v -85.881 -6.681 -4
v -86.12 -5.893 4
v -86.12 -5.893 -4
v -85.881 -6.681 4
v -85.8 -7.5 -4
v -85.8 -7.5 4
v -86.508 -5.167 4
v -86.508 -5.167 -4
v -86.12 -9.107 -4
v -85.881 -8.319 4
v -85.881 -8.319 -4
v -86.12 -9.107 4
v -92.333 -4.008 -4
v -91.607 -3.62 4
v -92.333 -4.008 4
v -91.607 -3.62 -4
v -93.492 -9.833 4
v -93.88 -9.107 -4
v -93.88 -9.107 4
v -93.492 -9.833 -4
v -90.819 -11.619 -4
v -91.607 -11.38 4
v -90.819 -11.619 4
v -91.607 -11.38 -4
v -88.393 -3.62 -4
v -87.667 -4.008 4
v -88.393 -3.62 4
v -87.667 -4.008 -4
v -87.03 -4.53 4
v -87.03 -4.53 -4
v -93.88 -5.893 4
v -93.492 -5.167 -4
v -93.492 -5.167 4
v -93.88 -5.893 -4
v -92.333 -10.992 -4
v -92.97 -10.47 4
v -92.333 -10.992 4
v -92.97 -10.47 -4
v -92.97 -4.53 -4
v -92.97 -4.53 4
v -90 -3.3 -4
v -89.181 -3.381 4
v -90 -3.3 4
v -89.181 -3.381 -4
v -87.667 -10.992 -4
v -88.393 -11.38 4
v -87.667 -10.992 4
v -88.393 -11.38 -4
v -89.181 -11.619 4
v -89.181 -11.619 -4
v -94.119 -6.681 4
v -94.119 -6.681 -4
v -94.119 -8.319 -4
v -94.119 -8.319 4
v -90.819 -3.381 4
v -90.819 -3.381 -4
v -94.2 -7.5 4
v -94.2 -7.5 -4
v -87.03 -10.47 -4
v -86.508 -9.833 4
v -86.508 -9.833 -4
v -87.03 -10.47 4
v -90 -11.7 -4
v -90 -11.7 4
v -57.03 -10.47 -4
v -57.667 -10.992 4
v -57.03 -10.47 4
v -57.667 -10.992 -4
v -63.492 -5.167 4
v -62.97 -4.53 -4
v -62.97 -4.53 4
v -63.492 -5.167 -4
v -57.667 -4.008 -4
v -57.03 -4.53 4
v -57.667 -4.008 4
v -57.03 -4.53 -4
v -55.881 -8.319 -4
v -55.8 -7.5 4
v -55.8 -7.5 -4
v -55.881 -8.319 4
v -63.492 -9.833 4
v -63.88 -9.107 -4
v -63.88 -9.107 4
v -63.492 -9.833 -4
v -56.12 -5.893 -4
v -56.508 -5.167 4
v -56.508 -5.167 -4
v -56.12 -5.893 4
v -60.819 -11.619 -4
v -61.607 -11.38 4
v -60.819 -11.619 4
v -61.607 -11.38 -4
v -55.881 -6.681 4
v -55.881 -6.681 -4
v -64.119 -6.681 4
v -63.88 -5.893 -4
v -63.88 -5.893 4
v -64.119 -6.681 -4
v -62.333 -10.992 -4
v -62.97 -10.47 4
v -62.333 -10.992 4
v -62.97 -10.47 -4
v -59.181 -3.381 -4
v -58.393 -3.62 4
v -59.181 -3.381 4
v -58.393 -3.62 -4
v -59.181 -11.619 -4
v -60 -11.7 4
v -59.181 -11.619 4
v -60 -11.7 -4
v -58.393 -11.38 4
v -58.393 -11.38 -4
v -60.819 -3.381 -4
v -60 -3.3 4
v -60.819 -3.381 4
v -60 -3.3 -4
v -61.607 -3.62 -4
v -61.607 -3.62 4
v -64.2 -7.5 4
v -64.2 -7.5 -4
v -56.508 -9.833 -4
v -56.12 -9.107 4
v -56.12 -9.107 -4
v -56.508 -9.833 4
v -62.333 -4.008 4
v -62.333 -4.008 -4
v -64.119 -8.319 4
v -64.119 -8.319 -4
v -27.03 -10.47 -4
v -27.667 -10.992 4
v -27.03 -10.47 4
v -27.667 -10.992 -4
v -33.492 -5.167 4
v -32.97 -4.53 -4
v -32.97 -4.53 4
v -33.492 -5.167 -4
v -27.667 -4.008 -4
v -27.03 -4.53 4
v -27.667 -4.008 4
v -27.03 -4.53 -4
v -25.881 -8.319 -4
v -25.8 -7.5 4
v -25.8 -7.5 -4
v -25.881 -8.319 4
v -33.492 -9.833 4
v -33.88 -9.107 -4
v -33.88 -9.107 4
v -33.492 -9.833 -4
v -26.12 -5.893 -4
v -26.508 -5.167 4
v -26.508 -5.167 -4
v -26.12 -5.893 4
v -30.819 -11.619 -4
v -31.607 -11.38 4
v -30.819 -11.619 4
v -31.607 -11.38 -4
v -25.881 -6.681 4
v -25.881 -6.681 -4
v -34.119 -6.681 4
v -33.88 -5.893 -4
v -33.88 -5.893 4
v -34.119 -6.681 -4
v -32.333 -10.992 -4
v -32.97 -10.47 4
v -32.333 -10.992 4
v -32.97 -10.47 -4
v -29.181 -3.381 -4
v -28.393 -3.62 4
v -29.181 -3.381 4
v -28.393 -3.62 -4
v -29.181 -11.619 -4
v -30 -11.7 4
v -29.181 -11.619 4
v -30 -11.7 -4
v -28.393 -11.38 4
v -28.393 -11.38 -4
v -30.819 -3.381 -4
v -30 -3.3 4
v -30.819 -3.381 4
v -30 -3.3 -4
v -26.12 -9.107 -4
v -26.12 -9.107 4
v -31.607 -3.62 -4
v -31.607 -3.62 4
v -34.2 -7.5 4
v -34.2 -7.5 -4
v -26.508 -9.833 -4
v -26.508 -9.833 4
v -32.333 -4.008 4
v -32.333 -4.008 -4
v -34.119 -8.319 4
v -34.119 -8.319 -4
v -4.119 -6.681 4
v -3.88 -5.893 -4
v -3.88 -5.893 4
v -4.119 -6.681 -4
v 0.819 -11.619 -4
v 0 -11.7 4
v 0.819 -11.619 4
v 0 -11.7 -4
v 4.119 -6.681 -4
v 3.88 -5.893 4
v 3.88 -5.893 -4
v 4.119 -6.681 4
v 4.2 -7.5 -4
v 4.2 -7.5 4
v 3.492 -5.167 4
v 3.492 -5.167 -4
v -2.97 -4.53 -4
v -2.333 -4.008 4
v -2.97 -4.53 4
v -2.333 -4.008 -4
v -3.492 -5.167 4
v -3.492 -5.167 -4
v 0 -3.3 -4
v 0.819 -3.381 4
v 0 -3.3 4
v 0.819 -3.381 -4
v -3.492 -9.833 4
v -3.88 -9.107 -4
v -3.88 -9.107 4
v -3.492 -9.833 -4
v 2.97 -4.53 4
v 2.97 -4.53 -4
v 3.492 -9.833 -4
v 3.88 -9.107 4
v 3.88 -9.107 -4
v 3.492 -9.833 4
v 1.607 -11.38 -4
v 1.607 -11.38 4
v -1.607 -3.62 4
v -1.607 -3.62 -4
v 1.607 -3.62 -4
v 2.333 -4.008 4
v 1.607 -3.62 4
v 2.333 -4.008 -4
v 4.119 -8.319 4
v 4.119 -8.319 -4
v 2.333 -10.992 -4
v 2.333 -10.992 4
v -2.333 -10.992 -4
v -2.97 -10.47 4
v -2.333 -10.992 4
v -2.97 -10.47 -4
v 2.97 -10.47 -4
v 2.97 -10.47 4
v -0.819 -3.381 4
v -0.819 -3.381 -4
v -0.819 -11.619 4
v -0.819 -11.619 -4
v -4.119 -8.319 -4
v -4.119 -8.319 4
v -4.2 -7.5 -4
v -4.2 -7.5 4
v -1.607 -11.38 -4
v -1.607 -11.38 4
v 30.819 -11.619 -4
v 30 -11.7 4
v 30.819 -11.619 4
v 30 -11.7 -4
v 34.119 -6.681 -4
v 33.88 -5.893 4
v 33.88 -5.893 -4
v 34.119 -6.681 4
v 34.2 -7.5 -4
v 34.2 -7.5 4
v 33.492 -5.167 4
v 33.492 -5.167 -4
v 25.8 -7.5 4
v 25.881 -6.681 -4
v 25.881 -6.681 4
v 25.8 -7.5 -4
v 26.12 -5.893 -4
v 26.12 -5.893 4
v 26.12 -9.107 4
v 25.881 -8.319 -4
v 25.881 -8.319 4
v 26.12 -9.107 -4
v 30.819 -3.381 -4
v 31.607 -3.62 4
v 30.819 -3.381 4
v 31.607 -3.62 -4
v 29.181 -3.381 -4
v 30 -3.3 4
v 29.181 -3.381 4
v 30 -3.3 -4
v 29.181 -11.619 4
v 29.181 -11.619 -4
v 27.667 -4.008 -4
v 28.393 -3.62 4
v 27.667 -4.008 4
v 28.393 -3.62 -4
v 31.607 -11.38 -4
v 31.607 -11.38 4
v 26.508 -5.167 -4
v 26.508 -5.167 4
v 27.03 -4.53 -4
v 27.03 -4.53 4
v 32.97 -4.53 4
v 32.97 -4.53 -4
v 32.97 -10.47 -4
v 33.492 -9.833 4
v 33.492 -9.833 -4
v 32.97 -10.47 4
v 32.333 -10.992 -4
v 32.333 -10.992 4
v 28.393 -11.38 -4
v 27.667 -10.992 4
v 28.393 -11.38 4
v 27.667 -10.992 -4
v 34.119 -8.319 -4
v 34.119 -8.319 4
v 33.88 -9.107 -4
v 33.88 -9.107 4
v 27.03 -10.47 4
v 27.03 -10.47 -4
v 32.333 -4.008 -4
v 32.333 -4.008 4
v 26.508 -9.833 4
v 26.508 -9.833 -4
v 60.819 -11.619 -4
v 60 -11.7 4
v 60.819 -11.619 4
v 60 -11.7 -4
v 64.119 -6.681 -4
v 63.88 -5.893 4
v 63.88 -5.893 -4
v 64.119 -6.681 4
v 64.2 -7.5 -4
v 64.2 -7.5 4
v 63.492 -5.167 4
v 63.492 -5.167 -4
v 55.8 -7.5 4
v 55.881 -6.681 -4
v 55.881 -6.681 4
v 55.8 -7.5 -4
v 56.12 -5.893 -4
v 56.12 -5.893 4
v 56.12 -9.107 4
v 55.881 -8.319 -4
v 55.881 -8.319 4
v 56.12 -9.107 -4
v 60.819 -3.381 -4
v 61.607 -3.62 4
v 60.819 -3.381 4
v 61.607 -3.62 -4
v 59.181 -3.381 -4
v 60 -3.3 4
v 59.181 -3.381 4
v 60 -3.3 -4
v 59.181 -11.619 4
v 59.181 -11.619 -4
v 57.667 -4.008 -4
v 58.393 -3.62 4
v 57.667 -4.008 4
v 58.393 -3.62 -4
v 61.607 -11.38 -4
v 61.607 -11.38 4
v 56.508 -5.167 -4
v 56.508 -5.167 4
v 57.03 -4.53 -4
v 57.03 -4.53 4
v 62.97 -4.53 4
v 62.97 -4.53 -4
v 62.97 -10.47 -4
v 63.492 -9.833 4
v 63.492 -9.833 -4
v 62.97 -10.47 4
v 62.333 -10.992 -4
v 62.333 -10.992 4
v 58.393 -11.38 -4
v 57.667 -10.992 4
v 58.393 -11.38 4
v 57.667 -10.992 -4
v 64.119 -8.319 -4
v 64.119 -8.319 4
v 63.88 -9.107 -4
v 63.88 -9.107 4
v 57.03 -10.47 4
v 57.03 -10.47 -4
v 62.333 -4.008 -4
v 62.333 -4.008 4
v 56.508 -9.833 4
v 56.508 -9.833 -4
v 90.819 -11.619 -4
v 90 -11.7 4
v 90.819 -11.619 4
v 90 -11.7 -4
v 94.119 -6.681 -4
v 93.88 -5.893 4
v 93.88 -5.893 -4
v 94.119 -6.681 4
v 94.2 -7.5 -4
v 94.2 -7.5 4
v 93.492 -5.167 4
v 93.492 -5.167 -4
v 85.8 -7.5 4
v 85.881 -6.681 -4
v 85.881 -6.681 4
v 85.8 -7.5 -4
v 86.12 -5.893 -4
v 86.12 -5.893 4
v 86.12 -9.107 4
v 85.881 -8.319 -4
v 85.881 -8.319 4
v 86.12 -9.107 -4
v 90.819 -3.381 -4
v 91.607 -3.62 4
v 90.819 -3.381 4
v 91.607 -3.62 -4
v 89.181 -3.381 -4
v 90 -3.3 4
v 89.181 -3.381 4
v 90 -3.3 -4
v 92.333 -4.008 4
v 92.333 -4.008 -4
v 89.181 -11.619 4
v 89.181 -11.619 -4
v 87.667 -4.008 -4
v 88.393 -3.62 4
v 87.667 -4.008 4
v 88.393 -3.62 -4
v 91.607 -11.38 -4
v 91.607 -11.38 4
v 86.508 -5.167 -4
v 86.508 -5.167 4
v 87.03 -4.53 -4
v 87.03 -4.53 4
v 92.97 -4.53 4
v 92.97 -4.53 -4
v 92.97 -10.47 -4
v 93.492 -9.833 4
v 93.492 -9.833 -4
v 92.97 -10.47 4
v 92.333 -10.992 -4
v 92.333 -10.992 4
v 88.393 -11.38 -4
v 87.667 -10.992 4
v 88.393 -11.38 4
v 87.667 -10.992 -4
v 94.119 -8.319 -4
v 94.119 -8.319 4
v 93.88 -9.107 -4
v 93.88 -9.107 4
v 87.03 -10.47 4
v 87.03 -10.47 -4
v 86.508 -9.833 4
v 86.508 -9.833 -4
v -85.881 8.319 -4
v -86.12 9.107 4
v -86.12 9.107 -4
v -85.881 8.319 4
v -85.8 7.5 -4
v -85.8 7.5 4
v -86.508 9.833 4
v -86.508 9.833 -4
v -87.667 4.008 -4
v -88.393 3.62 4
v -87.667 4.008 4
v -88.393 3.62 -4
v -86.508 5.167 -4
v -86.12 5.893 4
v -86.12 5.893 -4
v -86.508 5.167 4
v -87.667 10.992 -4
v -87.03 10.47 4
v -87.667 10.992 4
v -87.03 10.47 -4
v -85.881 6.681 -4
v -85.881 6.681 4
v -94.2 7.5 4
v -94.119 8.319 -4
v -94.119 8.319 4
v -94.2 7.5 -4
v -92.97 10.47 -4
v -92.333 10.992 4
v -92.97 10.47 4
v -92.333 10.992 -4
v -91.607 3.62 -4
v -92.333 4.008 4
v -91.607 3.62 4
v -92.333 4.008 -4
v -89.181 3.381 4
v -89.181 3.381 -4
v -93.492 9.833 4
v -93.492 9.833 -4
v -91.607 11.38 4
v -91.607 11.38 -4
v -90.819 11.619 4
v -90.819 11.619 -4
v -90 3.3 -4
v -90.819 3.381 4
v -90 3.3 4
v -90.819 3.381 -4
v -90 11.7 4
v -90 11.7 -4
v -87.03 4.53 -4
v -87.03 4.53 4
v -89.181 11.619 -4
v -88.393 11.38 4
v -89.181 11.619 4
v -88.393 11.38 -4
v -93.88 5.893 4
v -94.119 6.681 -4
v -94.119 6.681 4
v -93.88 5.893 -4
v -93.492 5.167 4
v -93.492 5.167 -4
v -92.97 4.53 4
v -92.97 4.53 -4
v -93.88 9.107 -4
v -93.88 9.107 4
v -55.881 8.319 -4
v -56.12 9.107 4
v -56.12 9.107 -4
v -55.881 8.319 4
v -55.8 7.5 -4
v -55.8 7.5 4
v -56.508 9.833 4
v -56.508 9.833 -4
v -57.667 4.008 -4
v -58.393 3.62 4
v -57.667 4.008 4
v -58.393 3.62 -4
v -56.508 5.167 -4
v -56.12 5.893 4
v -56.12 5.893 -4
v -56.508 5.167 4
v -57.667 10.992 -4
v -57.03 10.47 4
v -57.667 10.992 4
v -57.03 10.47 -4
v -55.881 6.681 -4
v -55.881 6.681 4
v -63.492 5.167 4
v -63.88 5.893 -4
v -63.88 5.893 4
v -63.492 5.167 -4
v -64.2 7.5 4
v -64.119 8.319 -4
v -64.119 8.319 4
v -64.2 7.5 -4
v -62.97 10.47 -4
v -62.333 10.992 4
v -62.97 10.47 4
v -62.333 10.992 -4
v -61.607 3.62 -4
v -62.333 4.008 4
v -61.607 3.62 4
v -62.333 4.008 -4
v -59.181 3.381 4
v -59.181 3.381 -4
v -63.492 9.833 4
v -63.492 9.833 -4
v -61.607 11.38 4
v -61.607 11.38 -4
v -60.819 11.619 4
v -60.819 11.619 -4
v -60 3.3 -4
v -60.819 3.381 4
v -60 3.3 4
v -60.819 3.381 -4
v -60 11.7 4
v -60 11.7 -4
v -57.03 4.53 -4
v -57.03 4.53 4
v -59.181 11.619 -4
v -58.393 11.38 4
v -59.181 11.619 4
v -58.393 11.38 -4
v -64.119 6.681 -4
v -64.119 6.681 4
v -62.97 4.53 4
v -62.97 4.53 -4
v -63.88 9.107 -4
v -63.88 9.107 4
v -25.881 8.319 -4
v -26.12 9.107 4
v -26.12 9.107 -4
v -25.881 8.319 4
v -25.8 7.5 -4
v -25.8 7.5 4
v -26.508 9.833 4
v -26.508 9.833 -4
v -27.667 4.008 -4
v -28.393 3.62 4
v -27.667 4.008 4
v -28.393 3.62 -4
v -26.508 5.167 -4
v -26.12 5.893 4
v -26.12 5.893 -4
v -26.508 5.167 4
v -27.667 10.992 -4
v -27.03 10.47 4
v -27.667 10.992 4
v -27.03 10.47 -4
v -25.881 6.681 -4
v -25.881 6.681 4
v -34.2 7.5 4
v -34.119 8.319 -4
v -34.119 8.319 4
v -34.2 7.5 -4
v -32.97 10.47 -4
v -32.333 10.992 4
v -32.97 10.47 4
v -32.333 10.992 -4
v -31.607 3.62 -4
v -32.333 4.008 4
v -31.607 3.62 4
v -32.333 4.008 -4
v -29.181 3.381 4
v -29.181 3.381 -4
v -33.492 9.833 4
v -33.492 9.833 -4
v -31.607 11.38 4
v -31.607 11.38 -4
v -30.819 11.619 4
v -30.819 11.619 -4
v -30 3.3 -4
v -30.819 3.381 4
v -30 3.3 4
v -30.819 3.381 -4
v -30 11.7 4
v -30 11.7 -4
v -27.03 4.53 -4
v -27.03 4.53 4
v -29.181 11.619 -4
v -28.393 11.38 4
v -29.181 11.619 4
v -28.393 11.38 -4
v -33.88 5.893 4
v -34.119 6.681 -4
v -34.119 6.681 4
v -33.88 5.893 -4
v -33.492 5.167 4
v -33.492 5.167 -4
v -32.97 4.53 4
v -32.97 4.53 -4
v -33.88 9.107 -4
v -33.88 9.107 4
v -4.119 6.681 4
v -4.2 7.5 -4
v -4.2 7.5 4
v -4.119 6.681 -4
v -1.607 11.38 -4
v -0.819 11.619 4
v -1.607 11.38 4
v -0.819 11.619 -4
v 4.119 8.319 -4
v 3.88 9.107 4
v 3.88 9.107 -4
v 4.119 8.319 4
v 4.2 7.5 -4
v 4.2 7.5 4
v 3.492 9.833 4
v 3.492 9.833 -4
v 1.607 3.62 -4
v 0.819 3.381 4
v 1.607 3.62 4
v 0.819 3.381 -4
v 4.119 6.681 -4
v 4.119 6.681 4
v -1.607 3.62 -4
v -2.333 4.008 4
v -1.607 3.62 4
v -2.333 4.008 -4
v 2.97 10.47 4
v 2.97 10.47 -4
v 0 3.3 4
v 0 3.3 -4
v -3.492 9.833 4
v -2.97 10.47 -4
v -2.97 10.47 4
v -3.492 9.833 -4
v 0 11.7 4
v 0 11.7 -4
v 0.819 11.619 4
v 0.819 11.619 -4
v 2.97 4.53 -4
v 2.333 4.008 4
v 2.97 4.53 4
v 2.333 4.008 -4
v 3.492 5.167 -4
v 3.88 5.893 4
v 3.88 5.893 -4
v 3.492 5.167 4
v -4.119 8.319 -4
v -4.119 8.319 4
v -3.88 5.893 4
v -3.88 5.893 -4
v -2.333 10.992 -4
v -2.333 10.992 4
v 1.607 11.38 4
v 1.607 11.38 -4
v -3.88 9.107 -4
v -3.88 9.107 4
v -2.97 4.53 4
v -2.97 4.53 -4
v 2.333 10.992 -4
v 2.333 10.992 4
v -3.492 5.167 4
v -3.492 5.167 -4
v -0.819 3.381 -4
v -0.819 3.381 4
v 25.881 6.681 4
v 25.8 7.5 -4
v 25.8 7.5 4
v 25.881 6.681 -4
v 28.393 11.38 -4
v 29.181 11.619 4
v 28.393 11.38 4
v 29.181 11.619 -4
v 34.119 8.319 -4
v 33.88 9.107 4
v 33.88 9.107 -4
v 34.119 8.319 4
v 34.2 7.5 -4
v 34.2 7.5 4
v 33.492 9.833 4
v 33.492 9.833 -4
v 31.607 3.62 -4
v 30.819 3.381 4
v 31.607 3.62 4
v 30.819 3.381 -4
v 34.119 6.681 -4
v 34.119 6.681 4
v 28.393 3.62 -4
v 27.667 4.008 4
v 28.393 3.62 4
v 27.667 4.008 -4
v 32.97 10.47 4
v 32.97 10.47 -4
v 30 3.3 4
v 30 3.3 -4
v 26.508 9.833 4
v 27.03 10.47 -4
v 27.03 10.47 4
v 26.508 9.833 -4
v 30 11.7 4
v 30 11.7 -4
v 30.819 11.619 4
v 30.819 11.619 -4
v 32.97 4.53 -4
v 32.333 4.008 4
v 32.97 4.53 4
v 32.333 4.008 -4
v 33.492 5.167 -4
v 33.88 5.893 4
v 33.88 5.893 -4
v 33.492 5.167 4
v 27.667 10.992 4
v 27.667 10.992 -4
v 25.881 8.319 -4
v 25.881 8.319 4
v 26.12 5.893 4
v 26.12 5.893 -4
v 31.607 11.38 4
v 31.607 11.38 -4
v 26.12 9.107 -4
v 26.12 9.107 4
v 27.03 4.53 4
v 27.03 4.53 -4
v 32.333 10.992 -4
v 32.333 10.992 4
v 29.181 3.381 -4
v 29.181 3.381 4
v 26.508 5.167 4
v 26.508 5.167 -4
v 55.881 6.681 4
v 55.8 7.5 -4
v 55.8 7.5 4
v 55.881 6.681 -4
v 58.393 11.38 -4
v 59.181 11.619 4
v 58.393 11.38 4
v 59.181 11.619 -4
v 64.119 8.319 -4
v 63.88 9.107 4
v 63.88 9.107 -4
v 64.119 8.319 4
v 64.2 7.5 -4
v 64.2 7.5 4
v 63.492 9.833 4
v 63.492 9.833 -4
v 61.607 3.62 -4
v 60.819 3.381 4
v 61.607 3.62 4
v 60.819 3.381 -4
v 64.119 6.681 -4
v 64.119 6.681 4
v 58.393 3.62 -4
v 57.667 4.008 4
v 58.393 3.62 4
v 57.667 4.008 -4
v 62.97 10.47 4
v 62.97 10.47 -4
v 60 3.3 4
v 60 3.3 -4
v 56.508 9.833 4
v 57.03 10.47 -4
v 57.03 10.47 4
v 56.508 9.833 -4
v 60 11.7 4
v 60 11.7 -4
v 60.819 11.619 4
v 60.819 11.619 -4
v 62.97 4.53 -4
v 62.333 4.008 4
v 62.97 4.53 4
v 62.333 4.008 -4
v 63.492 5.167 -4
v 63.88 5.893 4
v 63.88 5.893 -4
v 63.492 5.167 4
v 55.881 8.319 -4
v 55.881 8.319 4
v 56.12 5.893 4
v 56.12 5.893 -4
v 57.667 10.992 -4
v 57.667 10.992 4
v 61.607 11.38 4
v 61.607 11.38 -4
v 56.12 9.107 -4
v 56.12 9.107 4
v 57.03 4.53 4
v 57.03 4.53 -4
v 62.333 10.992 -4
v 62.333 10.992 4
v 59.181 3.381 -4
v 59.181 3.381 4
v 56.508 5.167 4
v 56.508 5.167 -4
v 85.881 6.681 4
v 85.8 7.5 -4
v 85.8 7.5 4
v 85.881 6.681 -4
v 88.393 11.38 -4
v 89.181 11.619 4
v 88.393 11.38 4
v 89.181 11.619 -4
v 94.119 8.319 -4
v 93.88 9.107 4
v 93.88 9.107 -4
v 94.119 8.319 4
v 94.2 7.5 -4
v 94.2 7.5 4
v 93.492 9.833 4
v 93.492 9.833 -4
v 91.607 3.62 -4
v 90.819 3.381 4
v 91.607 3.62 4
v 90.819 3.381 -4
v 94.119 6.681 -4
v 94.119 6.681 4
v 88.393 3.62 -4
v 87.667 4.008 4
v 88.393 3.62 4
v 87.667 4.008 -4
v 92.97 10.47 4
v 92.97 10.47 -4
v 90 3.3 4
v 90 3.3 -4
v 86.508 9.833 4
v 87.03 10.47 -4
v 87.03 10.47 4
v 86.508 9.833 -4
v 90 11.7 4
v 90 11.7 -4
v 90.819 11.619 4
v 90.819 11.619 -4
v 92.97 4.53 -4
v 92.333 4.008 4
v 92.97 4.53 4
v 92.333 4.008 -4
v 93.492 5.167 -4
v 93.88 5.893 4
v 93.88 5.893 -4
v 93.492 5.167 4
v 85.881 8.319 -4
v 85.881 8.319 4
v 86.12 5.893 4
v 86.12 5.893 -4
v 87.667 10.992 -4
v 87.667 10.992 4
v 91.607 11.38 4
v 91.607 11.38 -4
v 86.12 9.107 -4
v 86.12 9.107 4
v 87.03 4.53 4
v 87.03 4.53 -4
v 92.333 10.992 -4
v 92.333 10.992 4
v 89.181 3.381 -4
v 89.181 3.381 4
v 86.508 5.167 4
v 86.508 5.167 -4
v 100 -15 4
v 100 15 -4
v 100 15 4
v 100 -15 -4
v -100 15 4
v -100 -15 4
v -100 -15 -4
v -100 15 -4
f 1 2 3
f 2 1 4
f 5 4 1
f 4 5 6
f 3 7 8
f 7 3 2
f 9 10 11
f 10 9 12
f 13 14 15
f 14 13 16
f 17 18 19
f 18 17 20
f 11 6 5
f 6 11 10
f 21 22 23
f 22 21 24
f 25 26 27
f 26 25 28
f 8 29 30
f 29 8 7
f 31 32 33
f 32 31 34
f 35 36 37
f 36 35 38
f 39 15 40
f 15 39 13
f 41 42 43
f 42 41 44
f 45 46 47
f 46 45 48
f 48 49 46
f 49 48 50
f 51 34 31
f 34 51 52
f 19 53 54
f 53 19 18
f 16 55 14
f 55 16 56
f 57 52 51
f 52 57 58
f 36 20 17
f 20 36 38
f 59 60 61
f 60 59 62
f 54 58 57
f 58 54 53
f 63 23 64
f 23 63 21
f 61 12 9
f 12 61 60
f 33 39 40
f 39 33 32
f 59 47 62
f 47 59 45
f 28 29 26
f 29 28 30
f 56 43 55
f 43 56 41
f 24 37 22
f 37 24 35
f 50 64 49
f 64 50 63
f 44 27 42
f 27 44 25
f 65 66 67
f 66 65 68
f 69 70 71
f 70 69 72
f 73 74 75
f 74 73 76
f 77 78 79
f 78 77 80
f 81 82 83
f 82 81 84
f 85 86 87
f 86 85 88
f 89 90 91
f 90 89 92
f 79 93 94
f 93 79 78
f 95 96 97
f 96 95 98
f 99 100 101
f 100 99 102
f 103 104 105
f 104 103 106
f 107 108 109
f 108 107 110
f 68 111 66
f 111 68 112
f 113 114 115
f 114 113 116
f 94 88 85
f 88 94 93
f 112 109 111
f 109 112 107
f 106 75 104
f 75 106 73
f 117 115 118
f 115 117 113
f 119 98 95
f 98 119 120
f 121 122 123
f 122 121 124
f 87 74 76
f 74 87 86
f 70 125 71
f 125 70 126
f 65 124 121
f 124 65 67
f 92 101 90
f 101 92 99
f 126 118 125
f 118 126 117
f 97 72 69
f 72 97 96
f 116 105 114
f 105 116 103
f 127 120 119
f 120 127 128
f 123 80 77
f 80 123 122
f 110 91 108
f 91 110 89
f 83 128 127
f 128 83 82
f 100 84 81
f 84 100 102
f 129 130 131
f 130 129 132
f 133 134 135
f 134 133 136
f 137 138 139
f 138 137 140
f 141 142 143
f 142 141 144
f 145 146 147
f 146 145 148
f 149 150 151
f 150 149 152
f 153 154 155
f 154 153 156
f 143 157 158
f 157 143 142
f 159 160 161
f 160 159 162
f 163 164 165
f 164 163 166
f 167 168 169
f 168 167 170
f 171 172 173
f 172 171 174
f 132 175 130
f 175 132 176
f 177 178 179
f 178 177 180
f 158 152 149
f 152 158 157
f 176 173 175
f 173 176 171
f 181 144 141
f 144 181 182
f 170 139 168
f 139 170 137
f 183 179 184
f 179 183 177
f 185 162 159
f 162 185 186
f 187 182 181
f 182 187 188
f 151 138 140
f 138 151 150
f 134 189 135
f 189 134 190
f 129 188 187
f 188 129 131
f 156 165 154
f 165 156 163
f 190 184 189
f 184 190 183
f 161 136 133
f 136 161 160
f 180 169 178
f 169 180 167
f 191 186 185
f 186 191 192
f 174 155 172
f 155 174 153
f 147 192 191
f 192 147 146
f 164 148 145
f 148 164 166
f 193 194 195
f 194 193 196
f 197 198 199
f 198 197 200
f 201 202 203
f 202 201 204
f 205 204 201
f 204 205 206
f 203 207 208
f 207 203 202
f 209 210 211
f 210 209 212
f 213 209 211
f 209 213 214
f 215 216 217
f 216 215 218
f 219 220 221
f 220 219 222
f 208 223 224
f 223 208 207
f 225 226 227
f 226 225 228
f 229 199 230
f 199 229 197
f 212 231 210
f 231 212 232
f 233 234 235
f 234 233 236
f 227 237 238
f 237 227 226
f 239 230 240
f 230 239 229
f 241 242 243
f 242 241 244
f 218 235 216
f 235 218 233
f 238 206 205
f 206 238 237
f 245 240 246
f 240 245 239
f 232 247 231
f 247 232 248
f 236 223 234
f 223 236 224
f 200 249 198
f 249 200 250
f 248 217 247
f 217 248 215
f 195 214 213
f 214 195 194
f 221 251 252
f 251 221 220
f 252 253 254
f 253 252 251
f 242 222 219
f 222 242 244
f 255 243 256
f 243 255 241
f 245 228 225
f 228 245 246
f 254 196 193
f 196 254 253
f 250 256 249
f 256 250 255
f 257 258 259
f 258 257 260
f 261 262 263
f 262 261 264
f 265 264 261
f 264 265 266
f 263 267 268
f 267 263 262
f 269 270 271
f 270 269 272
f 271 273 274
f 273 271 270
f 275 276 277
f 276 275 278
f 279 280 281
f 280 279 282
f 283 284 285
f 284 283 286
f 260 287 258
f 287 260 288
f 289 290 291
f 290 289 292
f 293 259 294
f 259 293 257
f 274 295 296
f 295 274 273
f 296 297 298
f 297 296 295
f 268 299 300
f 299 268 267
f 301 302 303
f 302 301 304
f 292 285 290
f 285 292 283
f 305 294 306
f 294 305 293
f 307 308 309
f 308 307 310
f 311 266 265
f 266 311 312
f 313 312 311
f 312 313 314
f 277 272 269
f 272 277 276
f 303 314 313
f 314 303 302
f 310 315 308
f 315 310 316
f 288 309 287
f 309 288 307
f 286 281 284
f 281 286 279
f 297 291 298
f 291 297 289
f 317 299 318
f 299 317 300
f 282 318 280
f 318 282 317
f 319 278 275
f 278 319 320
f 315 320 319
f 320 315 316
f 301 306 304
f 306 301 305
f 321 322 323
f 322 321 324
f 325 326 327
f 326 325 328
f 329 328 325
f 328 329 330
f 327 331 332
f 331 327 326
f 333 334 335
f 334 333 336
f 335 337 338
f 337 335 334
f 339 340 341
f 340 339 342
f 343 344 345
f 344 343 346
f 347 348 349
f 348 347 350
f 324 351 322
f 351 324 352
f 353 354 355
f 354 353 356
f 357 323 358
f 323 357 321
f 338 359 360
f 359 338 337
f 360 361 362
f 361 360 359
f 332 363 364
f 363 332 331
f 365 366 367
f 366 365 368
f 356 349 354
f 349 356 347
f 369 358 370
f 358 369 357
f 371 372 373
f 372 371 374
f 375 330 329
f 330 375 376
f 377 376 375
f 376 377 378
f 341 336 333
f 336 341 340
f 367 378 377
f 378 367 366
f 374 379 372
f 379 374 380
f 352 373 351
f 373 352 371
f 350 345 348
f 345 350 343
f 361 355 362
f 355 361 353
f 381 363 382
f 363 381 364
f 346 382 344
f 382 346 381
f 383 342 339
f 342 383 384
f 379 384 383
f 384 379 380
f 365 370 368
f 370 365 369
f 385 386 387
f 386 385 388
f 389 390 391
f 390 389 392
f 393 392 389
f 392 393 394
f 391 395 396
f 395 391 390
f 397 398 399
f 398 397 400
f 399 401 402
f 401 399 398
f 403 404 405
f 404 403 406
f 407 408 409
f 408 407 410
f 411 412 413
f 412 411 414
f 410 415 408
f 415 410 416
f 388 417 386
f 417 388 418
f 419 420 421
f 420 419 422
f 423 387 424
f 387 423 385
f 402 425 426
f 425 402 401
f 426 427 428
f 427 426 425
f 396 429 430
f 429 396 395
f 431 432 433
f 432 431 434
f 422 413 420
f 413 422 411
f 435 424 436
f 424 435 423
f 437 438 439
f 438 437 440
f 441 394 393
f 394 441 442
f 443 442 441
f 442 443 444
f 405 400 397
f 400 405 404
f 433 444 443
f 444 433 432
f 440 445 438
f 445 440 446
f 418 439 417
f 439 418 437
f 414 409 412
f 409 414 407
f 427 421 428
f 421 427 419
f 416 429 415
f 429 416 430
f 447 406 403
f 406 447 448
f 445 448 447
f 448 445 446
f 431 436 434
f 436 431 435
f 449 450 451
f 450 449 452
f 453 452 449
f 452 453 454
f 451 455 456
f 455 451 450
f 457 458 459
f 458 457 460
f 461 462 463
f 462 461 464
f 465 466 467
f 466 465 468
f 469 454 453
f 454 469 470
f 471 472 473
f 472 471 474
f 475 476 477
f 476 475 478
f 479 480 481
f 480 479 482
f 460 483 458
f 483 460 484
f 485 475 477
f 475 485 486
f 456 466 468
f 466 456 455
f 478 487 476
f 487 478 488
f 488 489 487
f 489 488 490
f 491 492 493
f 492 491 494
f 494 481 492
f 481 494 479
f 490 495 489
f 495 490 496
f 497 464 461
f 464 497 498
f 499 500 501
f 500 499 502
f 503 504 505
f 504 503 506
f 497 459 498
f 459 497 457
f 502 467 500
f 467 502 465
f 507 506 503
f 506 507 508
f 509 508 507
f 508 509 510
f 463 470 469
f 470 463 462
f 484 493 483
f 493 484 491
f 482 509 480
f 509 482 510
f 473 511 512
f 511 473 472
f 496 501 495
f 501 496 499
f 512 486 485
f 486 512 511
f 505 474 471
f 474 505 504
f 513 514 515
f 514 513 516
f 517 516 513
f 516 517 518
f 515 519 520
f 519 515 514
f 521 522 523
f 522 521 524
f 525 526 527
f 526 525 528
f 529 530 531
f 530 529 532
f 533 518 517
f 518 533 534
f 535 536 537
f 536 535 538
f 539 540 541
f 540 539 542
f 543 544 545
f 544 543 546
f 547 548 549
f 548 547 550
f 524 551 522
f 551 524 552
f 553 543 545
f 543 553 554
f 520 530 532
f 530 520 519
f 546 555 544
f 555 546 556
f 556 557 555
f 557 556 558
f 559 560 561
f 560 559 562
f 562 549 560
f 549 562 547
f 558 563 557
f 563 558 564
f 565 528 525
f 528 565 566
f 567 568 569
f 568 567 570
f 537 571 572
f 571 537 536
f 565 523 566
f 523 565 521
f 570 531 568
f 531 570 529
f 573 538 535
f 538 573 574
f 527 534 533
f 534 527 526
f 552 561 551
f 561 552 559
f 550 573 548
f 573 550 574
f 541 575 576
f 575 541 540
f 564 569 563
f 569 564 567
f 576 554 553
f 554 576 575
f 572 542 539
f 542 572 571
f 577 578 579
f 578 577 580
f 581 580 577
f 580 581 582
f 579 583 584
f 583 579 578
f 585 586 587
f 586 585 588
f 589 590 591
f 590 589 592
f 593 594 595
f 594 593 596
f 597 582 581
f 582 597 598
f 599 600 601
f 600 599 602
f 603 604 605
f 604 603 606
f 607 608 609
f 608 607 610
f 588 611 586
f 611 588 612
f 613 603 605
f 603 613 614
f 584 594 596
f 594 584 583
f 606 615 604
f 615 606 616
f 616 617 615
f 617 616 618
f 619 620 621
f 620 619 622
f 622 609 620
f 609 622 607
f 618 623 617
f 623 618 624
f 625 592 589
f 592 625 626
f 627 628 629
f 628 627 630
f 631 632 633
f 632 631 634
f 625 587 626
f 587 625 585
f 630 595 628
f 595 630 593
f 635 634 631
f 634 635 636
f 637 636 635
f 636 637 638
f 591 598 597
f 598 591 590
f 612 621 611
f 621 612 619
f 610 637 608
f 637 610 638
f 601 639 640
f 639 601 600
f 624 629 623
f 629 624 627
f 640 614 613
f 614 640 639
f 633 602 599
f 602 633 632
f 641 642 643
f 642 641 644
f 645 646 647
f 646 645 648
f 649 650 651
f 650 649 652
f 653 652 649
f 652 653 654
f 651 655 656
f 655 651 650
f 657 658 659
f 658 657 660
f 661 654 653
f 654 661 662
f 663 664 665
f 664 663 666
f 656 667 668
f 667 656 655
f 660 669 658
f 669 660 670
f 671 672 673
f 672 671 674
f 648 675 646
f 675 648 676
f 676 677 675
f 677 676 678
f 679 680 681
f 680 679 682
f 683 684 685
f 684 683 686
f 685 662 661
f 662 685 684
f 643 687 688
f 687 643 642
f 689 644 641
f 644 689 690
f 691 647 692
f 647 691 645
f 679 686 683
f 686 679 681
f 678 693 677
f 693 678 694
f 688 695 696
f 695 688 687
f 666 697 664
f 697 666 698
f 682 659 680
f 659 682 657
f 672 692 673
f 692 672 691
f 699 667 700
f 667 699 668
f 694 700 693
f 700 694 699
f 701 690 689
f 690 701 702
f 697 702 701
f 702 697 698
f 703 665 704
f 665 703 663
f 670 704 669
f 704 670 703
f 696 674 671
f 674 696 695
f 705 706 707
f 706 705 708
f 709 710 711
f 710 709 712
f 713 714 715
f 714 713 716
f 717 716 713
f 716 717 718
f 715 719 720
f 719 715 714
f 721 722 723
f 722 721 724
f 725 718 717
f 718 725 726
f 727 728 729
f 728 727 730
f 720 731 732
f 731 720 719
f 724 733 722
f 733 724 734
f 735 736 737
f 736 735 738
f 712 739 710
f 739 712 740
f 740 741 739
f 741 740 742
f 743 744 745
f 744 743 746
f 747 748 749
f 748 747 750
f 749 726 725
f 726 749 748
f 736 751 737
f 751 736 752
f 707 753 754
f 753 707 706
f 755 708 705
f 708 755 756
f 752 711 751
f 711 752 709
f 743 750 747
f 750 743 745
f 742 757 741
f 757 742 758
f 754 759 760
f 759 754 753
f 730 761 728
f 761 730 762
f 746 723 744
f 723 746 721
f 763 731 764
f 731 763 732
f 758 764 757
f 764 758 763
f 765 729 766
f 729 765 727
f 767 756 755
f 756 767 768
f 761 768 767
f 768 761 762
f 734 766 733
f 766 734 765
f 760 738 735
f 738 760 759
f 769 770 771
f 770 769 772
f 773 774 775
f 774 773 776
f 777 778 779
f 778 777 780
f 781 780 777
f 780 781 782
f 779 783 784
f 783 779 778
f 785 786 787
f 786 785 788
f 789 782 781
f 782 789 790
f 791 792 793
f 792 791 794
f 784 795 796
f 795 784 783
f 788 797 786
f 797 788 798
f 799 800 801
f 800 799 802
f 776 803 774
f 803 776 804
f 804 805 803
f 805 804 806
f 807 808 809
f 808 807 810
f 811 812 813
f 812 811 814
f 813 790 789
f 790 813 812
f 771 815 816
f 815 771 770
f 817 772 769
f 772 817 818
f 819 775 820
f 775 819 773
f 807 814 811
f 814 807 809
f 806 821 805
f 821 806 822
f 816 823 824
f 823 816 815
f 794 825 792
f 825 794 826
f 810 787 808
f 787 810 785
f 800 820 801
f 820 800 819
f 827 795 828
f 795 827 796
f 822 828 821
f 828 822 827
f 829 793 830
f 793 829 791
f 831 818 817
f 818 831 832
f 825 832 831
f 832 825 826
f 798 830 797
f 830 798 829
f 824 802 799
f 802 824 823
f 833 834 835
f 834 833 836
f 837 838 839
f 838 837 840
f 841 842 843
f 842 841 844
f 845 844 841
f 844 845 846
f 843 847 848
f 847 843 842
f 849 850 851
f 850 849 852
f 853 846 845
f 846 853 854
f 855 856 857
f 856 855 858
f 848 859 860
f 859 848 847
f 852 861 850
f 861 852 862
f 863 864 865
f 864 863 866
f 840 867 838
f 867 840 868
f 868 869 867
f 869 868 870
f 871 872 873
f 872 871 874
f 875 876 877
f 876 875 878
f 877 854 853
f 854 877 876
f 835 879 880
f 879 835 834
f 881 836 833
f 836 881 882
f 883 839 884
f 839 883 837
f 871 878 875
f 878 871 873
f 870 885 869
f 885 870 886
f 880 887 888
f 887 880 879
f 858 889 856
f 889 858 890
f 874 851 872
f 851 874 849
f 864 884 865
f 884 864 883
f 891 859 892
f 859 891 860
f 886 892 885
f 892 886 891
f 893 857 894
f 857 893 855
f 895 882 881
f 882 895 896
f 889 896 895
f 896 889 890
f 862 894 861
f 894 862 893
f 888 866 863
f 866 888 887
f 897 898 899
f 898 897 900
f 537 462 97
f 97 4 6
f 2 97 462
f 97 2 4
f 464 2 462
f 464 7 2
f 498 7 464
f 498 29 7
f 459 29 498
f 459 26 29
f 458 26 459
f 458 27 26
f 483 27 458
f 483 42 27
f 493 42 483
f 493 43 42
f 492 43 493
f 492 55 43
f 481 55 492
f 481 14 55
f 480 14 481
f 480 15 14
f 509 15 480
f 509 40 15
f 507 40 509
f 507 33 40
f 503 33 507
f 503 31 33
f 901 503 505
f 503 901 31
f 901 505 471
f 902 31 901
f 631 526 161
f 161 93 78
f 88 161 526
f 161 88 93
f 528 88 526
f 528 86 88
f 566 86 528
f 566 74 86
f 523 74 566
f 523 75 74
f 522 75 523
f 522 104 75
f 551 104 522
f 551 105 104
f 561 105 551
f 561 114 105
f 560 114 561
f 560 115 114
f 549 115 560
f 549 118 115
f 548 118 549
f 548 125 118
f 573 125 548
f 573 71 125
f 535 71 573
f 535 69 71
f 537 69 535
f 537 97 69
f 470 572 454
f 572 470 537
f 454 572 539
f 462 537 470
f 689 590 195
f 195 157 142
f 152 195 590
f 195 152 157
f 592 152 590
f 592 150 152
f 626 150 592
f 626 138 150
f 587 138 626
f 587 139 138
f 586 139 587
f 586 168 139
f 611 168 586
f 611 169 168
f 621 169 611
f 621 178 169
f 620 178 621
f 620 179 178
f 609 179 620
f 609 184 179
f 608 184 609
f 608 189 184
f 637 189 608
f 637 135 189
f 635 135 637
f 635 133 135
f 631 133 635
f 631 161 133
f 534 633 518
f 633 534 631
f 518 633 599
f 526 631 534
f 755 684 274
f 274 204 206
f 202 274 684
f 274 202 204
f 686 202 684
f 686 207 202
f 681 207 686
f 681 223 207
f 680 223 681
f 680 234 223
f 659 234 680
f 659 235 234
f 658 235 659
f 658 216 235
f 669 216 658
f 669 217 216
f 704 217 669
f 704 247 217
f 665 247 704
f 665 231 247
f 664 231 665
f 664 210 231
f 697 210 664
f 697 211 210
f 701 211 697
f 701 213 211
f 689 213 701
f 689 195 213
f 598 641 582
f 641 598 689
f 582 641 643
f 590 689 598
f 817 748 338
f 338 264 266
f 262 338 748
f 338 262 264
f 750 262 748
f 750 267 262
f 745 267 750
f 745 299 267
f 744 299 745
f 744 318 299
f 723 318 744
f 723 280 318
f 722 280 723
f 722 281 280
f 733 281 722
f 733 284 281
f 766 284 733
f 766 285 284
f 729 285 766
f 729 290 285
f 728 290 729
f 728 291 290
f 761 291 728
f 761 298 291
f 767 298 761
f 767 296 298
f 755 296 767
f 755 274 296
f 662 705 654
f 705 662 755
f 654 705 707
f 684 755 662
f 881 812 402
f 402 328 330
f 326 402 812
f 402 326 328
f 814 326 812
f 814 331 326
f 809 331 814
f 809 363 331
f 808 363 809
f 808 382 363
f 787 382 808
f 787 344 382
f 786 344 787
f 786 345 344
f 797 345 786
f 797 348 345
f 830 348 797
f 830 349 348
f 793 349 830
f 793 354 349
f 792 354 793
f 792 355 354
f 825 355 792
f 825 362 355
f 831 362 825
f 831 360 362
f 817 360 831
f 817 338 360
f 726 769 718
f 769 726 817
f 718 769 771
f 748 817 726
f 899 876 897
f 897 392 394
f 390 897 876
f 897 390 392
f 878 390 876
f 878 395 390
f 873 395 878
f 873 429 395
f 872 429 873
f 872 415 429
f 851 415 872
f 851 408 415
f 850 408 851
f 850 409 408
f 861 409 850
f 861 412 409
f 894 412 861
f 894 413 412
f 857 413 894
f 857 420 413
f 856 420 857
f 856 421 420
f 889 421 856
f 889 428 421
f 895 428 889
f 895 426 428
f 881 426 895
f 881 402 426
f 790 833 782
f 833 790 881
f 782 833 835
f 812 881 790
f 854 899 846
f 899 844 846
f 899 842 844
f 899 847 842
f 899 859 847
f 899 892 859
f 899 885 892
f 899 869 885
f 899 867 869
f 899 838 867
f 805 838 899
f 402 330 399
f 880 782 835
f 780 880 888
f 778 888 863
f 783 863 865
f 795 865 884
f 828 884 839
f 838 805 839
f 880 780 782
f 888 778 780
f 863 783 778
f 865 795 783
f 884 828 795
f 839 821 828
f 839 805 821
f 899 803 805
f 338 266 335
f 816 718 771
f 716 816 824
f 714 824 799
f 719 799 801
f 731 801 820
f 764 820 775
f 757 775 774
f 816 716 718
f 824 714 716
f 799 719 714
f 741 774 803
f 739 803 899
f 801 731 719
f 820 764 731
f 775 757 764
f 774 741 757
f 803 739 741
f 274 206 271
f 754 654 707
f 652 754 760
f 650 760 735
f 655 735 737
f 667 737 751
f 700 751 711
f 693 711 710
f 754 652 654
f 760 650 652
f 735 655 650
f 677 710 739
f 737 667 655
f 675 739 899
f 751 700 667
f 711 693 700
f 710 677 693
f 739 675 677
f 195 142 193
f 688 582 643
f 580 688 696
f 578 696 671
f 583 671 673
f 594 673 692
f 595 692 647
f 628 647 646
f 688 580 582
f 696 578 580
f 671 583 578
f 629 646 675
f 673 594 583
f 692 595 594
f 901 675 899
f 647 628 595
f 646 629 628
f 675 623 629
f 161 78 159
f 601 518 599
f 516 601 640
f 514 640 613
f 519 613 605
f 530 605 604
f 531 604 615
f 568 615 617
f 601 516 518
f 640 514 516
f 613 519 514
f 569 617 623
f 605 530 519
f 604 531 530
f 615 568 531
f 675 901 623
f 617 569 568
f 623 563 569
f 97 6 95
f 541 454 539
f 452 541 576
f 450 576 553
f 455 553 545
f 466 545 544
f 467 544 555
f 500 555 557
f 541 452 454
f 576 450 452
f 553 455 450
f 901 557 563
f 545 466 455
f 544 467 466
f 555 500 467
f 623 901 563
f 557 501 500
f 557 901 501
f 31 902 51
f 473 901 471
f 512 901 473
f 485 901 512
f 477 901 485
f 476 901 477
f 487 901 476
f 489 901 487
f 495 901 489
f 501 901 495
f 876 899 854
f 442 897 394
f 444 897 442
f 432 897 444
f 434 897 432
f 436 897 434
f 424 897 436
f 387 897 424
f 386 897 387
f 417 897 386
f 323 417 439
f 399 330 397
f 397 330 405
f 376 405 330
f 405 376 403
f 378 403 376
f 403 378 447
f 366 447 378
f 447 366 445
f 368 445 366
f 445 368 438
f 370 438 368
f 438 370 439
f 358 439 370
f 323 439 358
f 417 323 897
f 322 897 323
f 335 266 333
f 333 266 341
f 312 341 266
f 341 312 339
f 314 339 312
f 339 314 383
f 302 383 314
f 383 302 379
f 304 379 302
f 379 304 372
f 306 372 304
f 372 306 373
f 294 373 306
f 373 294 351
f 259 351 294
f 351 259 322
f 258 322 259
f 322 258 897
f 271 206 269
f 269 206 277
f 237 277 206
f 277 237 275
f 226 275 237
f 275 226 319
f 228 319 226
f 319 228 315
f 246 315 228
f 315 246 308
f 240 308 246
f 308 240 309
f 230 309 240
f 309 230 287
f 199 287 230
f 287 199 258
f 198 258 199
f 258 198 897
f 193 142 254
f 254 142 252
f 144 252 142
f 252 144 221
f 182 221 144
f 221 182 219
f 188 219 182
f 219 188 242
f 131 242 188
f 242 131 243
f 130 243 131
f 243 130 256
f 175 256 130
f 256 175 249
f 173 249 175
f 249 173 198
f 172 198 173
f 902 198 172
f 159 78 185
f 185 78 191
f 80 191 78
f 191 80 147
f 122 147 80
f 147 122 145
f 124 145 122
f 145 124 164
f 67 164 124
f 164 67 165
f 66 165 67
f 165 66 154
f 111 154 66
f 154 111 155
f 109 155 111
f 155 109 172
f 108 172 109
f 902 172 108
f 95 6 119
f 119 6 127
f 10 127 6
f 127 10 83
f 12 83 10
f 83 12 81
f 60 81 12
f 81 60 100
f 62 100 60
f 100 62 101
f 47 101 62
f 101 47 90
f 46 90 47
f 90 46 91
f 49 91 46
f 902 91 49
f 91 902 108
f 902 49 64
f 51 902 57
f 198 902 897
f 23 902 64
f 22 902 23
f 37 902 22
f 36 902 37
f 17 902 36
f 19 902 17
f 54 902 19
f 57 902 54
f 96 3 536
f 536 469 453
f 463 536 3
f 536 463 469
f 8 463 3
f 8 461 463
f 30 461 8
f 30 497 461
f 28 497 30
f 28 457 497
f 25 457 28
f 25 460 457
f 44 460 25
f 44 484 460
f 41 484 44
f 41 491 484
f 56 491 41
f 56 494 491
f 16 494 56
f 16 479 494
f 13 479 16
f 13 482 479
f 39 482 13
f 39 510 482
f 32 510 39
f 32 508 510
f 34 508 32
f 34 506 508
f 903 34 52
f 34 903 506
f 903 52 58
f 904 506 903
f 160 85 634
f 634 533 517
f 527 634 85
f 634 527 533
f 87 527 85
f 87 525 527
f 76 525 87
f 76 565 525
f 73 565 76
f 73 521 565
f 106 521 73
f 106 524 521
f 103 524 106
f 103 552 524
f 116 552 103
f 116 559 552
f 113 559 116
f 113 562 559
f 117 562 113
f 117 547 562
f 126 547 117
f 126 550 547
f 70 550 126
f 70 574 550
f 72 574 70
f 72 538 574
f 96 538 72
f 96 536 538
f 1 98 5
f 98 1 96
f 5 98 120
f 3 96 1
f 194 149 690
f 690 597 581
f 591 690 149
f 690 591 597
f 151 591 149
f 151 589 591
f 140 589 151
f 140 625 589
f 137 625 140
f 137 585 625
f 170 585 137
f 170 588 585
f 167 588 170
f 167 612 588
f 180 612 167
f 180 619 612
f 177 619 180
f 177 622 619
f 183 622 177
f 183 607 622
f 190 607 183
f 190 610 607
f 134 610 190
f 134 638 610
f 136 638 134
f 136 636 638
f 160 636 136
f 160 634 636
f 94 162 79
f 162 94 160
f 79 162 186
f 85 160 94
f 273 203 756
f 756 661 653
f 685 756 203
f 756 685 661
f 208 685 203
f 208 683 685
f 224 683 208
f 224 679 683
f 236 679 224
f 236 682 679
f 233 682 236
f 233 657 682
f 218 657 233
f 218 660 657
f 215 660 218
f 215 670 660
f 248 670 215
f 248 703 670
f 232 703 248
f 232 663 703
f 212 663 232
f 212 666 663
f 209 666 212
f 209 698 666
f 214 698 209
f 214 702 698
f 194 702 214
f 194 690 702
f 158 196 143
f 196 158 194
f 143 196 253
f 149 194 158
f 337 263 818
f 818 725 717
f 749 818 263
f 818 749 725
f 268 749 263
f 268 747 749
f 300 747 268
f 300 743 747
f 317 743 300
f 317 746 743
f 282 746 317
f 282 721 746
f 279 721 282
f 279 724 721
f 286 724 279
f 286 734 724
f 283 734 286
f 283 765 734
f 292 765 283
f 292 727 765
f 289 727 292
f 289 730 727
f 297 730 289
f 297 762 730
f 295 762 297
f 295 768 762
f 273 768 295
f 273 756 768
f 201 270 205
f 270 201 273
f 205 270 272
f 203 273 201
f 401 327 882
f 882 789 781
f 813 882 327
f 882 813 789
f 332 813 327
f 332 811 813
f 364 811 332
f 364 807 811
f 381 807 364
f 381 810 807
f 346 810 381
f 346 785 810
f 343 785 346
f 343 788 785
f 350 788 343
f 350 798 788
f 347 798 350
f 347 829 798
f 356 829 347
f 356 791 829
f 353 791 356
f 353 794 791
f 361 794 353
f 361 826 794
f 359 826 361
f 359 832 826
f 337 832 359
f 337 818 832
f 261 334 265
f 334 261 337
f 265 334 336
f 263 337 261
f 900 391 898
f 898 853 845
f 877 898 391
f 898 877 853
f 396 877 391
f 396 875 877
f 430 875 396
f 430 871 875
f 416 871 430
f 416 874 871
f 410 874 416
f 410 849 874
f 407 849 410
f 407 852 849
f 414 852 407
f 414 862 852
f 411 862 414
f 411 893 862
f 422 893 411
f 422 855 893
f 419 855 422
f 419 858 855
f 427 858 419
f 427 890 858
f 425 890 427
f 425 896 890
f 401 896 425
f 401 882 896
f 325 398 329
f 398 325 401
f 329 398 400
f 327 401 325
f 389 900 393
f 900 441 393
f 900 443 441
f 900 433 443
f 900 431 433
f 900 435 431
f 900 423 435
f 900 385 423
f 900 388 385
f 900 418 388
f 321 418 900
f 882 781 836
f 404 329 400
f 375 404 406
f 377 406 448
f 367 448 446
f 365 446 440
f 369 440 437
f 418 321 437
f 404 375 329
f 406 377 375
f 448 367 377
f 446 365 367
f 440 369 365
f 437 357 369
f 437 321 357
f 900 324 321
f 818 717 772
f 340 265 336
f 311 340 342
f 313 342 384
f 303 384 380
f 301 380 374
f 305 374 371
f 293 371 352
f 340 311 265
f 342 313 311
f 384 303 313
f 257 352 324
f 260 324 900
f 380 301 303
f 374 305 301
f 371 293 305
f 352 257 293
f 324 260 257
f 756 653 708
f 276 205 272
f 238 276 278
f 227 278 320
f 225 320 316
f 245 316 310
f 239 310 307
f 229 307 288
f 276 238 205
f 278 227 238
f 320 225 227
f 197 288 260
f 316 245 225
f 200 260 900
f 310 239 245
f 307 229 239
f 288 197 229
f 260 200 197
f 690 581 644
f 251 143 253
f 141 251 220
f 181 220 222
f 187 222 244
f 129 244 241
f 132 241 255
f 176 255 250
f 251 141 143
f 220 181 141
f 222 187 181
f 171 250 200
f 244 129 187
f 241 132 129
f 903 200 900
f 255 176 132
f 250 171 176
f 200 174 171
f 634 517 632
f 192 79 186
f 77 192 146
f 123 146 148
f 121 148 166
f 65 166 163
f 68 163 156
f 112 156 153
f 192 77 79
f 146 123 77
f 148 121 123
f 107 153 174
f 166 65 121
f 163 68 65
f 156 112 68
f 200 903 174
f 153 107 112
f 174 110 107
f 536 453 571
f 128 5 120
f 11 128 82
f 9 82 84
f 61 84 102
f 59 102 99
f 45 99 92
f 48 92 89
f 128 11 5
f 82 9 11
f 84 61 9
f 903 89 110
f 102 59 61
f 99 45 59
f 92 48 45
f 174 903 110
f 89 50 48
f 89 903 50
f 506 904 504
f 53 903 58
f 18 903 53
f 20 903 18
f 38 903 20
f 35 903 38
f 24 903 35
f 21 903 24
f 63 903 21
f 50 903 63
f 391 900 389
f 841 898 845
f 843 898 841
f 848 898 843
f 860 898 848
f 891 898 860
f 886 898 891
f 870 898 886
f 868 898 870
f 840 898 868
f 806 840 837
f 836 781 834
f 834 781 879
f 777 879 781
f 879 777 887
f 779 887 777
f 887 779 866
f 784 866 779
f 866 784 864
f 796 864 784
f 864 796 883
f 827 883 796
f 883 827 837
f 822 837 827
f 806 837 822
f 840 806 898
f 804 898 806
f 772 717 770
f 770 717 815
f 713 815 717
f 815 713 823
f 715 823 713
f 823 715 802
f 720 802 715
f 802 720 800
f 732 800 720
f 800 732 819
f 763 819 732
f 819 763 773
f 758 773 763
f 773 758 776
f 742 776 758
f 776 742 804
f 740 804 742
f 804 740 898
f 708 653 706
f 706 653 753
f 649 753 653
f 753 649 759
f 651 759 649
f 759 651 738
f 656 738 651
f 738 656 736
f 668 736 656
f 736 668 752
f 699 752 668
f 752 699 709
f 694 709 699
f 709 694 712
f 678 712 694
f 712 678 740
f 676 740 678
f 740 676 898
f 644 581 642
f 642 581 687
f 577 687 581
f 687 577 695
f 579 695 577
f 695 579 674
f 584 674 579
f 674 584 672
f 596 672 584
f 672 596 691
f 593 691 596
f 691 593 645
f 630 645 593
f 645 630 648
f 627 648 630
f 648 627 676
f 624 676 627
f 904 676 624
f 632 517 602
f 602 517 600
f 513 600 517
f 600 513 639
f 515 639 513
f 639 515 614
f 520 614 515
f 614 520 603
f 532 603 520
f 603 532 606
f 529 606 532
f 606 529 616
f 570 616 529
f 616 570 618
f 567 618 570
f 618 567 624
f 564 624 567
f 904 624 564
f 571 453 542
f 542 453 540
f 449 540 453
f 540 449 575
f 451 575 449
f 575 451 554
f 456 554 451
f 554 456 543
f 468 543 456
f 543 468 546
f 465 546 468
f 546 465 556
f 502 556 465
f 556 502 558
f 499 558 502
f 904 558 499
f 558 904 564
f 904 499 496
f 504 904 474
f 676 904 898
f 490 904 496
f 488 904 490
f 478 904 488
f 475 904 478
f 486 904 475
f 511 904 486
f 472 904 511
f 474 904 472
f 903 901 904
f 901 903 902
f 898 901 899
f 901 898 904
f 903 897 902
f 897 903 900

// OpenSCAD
$fn = 32;

// ----------------------------------------------------------------------
// Hole bar, 7 x Ø8.4
// tworows layout, 10 mm edge offset
// ----------------------------------------------------------------------

// --- parameters (mm) ---
bar_w = 30;       // bar width (Y)
bar_t = 8;        // bar thickness (Z)
holes = 7;        // holes per row
hole_d = 8.4;     // hole diameter
edge = 10;        // offset from the bar end to the first hole
pitch = 30;       // pitch between neighbouring holes
row_offset = 15;  // distance between the two rows

// --- derived feature positions (mm) ---
span = (holes - 1) * pitch;   // = 180   distance between the end holes
bar_l = span + 2 * edge;      // = 200   overall bar length
start_x = -bar_l / 2 + edge;  // = -90   X of the first hole
feature_centers = [
  [start_x + 0 * pitch, -row_offset / 2],
  [start_x + 1 * pitch, -row_offset / 2],
  [start_x + 2 * pitch, -row_offset / 2],
  [start_x + 3 * pitch, -row_offset / 2],
  [start_x + 4 * pitch, -row_offset / 2],
  [start_x + 5 * pitch, -row_offset / 2],
  [start_x + 6 * pitch, -row_offset / 2]
];   // hole centres of the first row
row2_centers = [
  [start_x + 0 * pitch, row_offset / 2],
  [start_x + 1 * pitch, row_offset / 2],
  [start_x + 2 * pitch, row_offset / 2],
  [start_x + 3 * pitch, row_offset / 2],
  [start_x + 4 * pitch, row_offset / 2],
  [start_x + 5 * pitch, row_offset / 2],
  [start_x + 6 * pitch, row_offset / 2]
];   // hole centres of the second row

// bar with two rows of holes, both read from their own centre arrays
difference() {
  translate([-bar_l / 2, -bar_w / 2, -bar_t / 2]) cube([bar_l, bar_w, bar_t]);
  for (centre = feature_centers)
    translate([centre[0], centre[1], 0])
      cylinder(d = hole_d, h = bar_t + 2, center = true);
  for (centre = row2_centers)
    translate([centre[0], centre[1], 0])
      cylinder(d = hole_d, h = bar_t + 2, center = true);
}
